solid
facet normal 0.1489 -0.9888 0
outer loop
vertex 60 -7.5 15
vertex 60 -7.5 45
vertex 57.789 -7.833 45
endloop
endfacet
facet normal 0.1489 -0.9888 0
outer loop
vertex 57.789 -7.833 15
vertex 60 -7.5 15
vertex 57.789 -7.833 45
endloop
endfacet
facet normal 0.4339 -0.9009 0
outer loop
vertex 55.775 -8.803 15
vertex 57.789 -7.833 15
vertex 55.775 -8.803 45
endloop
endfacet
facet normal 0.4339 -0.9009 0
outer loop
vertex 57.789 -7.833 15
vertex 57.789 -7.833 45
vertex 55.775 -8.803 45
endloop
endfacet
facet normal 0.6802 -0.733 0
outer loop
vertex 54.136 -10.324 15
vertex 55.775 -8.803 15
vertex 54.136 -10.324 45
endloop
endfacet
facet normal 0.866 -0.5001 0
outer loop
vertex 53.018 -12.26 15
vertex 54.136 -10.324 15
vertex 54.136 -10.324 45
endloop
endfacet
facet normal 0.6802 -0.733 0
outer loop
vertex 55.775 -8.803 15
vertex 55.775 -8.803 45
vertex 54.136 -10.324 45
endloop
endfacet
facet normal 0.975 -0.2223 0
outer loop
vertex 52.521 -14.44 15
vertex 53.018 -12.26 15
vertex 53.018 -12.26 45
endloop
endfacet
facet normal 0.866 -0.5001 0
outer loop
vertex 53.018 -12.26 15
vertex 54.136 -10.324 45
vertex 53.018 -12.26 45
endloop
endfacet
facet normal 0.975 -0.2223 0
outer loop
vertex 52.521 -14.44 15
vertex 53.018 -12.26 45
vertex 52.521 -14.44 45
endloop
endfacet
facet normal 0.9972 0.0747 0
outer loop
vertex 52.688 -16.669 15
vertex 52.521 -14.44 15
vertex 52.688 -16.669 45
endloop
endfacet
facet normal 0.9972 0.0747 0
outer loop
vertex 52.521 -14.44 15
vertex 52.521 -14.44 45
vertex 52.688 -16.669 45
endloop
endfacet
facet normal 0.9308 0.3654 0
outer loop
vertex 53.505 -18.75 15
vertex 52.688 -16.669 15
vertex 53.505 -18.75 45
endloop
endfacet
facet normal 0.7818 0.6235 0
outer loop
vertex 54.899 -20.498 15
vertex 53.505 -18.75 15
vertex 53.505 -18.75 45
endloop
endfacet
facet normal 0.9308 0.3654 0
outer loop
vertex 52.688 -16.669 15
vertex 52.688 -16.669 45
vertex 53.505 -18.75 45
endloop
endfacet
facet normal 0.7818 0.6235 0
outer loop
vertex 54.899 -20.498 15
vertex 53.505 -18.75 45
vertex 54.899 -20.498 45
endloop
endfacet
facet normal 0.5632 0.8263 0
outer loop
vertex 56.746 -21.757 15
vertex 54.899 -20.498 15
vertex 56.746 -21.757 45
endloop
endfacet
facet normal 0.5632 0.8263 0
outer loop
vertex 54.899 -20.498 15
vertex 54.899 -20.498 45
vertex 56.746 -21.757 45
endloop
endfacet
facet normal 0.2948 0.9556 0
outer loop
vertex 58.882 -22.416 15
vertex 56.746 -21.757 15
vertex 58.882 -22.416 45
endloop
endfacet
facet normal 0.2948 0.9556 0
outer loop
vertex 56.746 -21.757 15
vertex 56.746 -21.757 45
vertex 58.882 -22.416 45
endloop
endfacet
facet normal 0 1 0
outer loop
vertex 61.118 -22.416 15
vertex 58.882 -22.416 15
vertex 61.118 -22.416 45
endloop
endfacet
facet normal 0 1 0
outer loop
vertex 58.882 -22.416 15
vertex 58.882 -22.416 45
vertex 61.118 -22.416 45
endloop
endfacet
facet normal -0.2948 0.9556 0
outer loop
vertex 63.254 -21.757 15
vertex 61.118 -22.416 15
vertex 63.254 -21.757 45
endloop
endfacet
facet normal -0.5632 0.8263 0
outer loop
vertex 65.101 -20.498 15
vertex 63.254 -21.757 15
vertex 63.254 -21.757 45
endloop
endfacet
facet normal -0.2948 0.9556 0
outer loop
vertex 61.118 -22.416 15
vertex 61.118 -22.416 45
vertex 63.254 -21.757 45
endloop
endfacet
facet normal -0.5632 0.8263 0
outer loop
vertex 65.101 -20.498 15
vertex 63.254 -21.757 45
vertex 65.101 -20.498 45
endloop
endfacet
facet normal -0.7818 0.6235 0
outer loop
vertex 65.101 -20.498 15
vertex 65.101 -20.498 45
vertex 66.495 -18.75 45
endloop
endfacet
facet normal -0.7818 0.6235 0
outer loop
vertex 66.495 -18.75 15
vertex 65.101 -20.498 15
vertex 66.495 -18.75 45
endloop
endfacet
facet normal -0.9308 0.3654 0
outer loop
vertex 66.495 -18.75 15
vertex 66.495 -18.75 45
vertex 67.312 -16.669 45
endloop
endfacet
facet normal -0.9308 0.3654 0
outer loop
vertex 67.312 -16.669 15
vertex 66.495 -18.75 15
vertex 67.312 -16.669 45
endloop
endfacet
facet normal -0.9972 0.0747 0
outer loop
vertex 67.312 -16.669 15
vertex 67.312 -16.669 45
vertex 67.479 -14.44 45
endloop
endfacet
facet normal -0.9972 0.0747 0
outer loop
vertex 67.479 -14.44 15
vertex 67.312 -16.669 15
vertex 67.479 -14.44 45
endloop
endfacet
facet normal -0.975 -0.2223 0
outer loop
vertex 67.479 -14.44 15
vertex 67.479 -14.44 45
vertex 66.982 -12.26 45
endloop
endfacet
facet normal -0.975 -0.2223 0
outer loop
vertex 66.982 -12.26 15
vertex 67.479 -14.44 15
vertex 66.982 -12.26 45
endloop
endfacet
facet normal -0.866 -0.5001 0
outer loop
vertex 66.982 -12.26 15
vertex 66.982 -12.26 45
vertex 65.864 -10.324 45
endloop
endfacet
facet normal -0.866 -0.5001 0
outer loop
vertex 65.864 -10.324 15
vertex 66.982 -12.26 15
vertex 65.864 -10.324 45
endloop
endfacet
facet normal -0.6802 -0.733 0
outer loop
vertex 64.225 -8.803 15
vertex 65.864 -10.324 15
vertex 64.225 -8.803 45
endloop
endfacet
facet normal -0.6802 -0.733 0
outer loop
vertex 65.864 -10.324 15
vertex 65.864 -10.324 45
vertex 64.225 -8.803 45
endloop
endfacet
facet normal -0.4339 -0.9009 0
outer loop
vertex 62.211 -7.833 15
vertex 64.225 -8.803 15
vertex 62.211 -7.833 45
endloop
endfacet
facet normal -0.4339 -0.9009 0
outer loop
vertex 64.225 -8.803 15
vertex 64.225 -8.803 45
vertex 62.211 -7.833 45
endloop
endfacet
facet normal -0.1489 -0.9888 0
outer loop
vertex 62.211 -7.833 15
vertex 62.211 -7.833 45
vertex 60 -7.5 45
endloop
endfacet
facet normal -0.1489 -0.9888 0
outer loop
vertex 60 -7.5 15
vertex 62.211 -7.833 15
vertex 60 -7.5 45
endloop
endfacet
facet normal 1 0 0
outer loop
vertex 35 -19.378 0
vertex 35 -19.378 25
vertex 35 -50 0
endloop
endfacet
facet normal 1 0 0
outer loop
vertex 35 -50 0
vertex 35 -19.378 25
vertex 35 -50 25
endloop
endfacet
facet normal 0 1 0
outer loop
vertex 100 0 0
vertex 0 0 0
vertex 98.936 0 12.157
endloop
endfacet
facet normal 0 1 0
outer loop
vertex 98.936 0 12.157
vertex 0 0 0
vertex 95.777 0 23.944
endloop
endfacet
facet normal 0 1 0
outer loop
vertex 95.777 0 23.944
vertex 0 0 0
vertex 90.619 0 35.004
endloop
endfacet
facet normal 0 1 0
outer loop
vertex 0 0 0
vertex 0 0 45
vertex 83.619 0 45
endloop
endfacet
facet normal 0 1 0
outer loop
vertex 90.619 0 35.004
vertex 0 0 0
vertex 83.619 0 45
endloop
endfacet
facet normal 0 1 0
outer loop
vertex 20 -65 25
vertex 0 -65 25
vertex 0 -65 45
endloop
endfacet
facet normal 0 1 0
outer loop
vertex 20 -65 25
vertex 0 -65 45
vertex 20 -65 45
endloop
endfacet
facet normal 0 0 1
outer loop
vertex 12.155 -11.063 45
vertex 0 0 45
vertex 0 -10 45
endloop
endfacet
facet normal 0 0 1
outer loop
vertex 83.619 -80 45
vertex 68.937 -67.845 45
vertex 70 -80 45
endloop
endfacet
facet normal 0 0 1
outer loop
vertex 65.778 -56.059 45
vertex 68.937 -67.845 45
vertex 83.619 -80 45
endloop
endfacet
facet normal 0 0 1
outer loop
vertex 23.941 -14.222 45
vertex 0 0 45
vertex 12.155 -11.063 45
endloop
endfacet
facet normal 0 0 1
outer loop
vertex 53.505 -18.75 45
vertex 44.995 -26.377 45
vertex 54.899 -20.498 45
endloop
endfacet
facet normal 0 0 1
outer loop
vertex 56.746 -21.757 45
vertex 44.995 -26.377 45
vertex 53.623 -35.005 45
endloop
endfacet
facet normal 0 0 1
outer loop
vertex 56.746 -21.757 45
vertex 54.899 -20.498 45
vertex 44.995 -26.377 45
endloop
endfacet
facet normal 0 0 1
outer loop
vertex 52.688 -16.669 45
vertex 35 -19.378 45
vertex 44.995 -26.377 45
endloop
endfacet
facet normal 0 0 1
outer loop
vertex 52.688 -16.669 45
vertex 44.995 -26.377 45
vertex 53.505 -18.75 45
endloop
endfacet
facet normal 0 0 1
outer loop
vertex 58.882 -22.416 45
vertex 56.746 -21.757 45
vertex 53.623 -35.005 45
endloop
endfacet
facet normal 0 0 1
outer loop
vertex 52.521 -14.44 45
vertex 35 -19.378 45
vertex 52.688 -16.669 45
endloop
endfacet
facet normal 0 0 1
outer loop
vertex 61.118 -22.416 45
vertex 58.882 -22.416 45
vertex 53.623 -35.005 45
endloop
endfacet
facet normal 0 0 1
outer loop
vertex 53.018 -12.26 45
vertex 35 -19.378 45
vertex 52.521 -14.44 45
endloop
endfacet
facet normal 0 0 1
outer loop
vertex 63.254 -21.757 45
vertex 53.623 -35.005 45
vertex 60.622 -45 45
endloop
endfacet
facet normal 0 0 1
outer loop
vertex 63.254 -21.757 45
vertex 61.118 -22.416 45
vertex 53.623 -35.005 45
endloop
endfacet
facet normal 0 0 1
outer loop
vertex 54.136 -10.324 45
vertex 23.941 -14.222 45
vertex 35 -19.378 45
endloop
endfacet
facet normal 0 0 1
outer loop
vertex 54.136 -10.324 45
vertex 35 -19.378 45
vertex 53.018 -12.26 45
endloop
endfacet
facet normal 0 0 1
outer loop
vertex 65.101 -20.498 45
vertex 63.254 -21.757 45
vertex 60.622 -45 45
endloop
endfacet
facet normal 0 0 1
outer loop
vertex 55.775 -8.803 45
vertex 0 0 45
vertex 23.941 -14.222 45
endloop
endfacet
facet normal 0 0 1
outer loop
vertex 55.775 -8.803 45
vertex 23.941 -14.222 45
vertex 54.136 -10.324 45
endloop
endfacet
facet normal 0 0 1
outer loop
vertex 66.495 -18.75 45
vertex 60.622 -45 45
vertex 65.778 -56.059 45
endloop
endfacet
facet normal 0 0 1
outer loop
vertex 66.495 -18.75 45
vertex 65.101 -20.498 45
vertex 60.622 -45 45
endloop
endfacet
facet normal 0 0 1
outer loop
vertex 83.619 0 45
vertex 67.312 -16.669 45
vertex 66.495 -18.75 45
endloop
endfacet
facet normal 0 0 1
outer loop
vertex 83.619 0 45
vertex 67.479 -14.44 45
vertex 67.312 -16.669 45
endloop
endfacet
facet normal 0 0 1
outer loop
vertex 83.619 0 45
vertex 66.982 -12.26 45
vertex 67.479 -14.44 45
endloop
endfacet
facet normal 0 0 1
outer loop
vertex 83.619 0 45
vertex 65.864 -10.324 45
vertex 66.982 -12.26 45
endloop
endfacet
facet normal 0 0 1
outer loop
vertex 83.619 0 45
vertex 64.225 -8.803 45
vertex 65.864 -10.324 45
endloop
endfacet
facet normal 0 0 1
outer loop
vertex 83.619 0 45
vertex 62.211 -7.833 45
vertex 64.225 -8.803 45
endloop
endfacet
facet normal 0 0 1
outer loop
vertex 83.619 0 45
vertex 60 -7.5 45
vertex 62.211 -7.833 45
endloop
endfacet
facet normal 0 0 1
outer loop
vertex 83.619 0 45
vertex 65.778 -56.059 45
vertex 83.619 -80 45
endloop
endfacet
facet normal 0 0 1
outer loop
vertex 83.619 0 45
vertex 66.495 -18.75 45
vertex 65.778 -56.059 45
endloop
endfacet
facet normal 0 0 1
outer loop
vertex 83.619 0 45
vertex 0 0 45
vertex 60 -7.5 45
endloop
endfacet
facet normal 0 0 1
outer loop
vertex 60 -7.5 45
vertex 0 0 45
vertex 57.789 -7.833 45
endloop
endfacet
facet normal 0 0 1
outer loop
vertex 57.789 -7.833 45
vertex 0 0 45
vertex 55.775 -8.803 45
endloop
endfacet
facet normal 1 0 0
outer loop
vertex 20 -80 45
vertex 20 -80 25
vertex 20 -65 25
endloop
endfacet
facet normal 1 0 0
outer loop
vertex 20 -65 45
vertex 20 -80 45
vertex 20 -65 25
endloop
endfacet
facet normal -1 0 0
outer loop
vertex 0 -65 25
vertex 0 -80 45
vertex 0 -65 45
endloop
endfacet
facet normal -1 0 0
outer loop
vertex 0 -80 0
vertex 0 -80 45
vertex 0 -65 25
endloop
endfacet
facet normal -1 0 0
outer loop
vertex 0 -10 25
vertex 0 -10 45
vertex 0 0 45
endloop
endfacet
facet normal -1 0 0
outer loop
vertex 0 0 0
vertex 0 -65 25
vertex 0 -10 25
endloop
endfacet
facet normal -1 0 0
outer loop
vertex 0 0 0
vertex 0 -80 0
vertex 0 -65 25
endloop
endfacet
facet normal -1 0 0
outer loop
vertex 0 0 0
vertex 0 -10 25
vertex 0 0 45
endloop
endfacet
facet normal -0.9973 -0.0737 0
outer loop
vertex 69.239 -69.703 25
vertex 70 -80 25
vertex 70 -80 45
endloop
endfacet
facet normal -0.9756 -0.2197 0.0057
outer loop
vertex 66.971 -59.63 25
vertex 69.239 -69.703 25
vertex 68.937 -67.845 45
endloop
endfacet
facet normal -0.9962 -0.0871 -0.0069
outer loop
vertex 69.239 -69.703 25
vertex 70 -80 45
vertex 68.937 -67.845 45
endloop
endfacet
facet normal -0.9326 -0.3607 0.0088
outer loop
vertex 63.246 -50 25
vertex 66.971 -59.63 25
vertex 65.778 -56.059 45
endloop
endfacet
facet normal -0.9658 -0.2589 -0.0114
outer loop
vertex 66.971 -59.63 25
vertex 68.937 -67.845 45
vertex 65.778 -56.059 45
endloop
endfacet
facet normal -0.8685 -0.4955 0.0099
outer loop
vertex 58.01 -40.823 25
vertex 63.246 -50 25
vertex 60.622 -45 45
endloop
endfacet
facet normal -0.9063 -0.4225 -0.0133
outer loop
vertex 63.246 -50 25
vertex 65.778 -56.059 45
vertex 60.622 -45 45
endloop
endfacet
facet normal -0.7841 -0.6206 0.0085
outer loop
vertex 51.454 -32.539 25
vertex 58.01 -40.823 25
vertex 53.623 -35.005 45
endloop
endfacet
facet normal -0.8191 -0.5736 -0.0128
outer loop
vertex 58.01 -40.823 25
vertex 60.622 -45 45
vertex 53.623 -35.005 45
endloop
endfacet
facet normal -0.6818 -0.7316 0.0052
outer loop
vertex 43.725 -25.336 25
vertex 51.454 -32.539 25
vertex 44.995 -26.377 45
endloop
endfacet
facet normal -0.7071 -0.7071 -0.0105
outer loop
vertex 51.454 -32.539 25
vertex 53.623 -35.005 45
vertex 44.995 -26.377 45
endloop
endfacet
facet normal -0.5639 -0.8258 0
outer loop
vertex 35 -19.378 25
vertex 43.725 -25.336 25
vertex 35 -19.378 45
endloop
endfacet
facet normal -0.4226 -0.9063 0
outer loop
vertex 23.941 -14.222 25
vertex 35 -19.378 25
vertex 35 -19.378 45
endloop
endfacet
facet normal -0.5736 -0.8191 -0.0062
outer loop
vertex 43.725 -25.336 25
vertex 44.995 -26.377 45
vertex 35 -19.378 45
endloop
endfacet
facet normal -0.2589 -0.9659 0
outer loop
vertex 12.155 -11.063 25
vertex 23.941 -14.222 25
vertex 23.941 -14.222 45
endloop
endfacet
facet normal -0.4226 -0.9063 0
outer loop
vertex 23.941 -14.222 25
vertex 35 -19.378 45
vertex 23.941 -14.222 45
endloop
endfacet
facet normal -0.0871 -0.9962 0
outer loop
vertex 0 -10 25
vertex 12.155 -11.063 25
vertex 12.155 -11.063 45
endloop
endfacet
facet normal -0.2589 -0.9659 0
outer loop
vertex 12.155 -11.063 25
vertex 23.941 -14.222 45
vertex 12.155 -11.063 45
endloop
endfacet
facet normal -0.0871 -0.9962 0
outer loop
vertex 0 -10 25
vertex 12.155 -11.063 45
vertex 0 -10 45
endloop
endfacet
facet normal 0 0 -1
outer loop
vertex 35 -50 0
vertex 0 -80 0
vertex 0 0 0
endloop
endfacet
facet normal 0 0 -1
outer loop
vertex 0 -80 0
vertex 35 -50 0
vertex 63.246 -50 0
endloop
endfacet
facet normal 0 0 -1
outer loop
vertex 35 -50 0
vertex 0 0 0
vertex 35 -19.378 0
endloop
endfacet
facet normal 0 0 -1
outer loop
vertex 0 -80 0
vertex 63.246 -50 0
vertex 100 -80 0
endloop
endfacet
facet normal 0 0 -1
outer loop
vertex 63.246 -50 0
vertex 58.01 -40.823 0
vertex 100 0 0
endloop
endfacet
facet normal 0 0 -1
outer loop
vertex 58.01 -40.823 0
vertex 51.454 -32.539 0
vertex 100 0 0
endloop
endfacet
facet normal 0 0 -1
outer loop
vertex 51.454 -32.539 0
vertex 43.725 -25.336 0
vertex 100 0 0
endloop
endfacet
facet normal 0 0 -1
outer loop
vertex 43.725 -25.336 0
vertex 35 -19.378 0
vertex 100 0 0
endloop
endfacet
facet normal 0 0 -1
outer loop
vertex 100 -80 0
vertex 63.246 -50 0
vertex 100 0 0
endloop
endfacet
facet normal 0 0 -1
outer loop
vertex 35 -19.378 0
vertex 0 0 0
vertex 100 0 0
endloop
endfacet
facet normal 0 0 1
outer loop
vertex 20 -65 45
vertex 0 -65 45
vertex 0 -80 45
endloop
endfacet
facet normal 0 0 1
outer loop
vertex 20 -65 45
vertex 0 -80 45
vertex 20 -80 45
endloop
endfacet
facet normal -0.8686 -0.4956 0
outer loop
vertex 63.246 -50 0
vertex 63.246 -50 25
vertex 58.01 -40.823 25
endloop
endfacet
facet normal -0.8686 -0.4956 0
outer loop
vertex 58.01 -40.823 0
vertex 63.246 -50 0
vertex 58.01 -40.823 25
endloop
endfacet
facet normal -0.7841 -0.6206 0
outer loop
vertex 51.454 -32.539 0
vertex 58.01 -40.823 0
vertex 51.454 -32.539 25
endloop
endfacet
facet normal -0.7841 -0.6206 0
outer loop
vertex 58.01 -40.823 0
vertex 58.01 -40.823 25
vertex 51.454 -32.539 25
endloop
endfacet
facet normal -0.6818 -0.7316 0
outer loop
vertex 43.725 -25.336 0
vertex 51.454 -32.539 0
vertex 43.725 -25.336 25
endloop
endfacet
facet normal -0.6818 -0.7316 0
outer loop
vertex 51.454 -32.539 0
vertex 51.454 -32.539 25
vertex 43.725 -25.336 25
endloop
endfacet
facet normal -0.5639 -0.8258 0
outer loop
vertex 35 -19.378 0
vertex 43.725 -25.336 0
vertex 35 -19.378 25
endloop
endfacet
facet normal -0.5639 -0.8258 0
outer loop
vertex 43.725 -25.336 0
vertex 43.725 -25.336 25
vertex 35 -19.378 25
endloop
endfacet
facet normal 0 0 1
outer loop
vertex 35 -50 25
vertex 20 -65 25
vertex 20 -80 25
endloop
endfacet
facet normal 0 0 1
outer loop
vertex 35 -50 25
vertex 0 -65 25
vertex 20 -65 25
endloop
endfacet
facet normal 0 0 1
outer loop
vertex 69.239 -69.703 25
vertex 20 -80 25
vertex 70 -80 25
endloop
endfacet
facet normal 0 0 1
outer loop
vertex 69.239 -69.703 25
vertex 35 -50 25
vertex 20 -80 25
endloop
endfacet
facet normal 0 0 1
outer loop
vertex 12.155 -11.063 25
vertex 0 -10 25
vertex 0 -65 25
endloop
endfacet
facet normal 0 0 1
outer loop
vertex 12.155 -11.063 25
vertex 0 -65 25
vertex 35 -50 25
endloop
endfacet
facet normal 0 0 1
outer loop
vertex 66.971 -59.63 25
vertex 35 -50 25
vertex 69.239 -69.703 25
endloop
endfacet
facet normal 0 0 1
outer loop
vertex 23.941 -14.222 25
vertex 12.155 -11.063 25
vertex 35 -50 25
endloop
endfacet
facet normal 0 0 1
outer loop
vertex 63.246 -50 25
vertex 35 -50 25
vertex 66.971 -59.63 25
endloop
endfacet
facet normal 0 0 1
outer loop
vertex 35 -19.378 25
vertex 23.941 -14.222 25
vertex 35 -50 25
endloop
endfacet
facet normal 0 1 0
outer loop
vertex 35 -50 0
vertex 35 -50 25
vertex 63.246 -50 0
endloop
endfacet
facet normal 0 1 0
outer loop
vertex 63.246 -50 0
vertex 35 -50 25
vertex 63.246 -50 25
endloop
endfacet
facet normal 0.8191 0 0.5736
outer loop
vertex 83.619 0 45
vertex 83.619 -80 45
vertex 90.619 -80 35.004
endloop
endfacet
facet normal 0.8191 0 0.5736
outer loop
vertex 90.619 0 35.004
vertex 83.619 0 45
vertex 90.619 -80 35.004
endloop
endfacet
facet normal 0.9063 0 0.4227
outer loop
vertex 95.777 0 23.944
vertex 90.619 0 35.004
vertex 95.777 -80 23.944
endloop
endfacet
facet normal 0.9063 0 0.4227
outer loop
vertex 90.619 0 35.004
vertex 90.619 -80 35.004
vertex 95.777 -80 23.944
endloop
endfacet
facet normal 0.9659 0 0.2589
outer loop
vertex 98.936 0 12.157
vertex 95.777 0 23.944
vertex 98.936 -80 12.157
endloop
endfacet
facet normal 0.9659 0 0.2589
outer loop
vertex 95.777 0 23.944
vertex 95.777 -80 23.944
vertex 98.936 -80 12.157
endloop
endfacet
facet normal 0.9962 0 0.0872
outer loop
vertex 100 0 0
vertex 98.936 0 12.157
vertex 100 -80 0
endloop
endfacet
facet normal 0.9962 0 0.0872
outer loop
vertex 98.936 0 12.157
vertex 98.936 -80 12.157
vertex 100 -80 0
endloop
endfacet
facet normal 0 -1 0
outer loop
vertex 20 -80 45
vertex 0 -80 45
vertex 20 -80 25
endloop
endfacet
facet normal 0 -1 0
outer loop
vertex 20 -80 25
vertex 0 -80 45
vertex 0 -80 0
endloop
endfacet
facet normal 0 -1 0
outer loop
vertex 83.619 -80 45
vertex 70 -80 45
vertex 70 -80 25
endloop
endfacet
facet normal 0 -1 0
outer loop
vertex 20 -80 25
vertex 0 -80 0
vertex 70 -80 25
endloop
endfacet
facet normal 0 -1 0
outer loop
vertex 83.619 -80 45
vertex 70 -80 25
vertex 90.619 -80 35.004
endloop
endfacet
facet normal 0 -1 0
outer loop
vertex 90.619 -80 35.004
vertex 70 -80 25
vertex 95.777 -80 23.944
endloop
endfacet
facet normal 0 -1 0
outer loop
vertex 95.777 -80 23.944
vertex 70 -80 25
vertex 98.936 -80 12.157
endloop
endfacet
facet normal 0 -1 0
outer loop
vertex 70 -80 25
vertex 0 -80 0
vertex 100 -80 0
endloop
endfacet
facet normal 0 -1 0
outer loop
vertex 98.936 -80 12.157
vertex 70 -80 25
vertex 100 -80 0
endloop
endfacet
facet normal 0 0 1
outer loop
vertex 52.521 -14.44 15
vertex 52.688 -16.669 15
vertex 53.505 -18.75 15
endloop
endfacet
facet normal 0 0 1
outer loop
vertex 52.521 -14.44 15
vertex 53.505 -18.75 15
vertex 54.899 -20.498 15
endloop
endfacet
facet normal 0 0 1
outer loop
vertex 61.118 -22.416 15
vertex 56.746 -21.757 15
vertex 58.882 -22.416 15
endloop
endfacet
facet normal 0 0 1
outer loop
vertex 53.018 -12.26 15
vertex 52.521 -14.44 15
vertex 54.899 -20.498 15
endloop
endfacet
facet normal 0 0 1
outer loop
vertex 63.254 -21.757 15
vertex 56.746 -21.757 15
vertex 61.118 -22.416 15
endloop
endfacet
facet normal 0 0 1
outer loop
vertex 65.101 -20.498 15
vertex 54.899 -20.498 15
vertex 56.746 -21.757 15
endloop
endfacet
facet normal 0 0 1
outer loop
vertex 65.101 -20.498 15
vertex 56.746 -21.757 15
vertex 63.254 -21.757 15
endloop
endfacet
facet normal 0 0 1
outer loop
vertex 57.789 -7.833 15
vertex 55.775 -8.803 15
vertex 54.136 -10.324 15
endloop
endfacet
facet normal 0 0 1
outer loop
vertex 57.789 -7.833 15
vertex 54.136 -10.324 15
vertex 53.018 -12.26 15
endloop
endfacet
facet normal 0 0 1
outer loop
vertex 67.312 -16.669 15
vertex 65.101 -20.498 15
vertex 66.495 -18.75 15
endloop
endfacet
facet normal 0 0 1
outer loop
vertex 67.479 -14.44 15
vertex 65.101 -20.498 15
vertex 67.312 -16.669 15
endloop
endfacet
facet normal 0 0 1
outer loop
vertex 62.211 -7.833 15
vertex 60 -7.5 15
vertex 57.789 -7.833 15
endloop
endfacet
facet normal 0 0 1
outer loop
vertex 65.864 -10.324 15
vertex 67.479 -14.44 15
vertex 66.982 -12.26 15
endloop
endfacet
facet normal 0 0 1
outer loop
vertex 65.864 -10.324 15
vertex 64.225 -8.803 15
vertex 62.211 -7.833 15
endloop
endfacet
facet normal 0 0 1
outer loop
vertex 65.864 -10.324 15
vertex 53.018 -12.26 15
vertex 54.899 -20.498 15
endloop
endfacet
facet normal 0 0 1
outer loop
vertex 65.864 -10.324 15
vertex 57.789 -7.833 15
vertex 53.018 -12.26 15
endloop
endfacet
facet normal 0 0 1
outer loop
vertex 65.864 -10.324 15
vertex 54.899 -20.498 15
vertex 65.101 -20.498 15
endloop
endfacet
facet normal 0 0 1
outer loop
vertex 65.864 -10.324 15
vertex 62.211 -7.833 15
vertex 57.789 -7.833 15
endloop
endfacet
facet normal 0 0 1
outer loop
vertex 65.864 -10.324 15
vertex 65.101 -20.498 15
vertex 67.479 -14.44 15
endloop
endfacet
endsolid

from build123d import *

# Parameters (mm, degrees)
F0_W      = 100
F0_H      = 45
F1_DEPTH  = 80
F3_DEPTH  = 20
F5_DEPTH  = 30
F6_W      = 20
F6_H      = 15
F7_DEPTH  = 20
F9_DEPTH  = 25.001
F11_DEPTH = 80.001


with BuildPart() as f1:
    # F0 (on Front) → F1 (new body)
    with BuildSketch(Plane.XZ):
        with Locations((50, 22.5)):
            Rectangle(F0_W, F0_H)
    extrude(amount=F1_DEPTH)

    # F2 (on face) → F3 (cut)
    with BuildSketch(Plane.XY.offset(45)):
        with BuildLine():
            Line((0, -80), (70, -80))
            ThreePointArc((70, -80), (49.4974746831, -30.5025253169), (0, -10))
            Line((0, -10), (0, -80))
        make_face()
    extrude(amount=-F3_DEPTH, mode=Mode.SUBTRACT)

    # F4 (on face) → F5 (cut)
    with BuildSketch(Plane.XY.offset(45)):
        with BuildLine():
            ThreePointArc((67.5, -15), (65.3033008589, -9.6966991411), (60, -7.5))
            ThreePointArc((60, -7.5), (54.6966991411, -20.3033008589), (67.5, -15))
        make_face()
    extrude(amount=-F5_DEPTH, mode=Mode.SUBTRACT)

    # F6 (on face) → F7 (join)
    with BuildSketch(Plane.XY.offset(25)):
        with Locations((10, -72.5)):
            Rectangle(F6_W, F6_H)
    extrude(amount=F7_DEPTH)

    # F8 (on face) → F9 (cut, through all)
    with BuildSketch(Plane.XY.offset(25)):
        with BuildLine():
            Line((35, -19.3782217351), (35, -50))
            Line((35, -50), (63.2455532034, -50))
            ThreePointArc((63.2455532034, -50), (51.4535762322, -32.5391793906), (35, -19.3782217351))
        make_face()
    extrude(amount=-F9_DEPTH, mode=Mode.SUBTRACT)

    # F10 (on face) → F11 (cut, through all)
    with BuildSketch(Plane.XZ.offset(80)):
        with BuildLine():
            ThreePointArc((83.6190264738, 45), (95.7773967757, 23.944395449), (100, 0))
            Line((100, 0), (100, 45))
            Line((100, 45), (83.6190264738, 45))
        make_face()
    extrude(amount=-F11_DEPTH, mode=Mode.SUBTRACT)


solid = f1.part
